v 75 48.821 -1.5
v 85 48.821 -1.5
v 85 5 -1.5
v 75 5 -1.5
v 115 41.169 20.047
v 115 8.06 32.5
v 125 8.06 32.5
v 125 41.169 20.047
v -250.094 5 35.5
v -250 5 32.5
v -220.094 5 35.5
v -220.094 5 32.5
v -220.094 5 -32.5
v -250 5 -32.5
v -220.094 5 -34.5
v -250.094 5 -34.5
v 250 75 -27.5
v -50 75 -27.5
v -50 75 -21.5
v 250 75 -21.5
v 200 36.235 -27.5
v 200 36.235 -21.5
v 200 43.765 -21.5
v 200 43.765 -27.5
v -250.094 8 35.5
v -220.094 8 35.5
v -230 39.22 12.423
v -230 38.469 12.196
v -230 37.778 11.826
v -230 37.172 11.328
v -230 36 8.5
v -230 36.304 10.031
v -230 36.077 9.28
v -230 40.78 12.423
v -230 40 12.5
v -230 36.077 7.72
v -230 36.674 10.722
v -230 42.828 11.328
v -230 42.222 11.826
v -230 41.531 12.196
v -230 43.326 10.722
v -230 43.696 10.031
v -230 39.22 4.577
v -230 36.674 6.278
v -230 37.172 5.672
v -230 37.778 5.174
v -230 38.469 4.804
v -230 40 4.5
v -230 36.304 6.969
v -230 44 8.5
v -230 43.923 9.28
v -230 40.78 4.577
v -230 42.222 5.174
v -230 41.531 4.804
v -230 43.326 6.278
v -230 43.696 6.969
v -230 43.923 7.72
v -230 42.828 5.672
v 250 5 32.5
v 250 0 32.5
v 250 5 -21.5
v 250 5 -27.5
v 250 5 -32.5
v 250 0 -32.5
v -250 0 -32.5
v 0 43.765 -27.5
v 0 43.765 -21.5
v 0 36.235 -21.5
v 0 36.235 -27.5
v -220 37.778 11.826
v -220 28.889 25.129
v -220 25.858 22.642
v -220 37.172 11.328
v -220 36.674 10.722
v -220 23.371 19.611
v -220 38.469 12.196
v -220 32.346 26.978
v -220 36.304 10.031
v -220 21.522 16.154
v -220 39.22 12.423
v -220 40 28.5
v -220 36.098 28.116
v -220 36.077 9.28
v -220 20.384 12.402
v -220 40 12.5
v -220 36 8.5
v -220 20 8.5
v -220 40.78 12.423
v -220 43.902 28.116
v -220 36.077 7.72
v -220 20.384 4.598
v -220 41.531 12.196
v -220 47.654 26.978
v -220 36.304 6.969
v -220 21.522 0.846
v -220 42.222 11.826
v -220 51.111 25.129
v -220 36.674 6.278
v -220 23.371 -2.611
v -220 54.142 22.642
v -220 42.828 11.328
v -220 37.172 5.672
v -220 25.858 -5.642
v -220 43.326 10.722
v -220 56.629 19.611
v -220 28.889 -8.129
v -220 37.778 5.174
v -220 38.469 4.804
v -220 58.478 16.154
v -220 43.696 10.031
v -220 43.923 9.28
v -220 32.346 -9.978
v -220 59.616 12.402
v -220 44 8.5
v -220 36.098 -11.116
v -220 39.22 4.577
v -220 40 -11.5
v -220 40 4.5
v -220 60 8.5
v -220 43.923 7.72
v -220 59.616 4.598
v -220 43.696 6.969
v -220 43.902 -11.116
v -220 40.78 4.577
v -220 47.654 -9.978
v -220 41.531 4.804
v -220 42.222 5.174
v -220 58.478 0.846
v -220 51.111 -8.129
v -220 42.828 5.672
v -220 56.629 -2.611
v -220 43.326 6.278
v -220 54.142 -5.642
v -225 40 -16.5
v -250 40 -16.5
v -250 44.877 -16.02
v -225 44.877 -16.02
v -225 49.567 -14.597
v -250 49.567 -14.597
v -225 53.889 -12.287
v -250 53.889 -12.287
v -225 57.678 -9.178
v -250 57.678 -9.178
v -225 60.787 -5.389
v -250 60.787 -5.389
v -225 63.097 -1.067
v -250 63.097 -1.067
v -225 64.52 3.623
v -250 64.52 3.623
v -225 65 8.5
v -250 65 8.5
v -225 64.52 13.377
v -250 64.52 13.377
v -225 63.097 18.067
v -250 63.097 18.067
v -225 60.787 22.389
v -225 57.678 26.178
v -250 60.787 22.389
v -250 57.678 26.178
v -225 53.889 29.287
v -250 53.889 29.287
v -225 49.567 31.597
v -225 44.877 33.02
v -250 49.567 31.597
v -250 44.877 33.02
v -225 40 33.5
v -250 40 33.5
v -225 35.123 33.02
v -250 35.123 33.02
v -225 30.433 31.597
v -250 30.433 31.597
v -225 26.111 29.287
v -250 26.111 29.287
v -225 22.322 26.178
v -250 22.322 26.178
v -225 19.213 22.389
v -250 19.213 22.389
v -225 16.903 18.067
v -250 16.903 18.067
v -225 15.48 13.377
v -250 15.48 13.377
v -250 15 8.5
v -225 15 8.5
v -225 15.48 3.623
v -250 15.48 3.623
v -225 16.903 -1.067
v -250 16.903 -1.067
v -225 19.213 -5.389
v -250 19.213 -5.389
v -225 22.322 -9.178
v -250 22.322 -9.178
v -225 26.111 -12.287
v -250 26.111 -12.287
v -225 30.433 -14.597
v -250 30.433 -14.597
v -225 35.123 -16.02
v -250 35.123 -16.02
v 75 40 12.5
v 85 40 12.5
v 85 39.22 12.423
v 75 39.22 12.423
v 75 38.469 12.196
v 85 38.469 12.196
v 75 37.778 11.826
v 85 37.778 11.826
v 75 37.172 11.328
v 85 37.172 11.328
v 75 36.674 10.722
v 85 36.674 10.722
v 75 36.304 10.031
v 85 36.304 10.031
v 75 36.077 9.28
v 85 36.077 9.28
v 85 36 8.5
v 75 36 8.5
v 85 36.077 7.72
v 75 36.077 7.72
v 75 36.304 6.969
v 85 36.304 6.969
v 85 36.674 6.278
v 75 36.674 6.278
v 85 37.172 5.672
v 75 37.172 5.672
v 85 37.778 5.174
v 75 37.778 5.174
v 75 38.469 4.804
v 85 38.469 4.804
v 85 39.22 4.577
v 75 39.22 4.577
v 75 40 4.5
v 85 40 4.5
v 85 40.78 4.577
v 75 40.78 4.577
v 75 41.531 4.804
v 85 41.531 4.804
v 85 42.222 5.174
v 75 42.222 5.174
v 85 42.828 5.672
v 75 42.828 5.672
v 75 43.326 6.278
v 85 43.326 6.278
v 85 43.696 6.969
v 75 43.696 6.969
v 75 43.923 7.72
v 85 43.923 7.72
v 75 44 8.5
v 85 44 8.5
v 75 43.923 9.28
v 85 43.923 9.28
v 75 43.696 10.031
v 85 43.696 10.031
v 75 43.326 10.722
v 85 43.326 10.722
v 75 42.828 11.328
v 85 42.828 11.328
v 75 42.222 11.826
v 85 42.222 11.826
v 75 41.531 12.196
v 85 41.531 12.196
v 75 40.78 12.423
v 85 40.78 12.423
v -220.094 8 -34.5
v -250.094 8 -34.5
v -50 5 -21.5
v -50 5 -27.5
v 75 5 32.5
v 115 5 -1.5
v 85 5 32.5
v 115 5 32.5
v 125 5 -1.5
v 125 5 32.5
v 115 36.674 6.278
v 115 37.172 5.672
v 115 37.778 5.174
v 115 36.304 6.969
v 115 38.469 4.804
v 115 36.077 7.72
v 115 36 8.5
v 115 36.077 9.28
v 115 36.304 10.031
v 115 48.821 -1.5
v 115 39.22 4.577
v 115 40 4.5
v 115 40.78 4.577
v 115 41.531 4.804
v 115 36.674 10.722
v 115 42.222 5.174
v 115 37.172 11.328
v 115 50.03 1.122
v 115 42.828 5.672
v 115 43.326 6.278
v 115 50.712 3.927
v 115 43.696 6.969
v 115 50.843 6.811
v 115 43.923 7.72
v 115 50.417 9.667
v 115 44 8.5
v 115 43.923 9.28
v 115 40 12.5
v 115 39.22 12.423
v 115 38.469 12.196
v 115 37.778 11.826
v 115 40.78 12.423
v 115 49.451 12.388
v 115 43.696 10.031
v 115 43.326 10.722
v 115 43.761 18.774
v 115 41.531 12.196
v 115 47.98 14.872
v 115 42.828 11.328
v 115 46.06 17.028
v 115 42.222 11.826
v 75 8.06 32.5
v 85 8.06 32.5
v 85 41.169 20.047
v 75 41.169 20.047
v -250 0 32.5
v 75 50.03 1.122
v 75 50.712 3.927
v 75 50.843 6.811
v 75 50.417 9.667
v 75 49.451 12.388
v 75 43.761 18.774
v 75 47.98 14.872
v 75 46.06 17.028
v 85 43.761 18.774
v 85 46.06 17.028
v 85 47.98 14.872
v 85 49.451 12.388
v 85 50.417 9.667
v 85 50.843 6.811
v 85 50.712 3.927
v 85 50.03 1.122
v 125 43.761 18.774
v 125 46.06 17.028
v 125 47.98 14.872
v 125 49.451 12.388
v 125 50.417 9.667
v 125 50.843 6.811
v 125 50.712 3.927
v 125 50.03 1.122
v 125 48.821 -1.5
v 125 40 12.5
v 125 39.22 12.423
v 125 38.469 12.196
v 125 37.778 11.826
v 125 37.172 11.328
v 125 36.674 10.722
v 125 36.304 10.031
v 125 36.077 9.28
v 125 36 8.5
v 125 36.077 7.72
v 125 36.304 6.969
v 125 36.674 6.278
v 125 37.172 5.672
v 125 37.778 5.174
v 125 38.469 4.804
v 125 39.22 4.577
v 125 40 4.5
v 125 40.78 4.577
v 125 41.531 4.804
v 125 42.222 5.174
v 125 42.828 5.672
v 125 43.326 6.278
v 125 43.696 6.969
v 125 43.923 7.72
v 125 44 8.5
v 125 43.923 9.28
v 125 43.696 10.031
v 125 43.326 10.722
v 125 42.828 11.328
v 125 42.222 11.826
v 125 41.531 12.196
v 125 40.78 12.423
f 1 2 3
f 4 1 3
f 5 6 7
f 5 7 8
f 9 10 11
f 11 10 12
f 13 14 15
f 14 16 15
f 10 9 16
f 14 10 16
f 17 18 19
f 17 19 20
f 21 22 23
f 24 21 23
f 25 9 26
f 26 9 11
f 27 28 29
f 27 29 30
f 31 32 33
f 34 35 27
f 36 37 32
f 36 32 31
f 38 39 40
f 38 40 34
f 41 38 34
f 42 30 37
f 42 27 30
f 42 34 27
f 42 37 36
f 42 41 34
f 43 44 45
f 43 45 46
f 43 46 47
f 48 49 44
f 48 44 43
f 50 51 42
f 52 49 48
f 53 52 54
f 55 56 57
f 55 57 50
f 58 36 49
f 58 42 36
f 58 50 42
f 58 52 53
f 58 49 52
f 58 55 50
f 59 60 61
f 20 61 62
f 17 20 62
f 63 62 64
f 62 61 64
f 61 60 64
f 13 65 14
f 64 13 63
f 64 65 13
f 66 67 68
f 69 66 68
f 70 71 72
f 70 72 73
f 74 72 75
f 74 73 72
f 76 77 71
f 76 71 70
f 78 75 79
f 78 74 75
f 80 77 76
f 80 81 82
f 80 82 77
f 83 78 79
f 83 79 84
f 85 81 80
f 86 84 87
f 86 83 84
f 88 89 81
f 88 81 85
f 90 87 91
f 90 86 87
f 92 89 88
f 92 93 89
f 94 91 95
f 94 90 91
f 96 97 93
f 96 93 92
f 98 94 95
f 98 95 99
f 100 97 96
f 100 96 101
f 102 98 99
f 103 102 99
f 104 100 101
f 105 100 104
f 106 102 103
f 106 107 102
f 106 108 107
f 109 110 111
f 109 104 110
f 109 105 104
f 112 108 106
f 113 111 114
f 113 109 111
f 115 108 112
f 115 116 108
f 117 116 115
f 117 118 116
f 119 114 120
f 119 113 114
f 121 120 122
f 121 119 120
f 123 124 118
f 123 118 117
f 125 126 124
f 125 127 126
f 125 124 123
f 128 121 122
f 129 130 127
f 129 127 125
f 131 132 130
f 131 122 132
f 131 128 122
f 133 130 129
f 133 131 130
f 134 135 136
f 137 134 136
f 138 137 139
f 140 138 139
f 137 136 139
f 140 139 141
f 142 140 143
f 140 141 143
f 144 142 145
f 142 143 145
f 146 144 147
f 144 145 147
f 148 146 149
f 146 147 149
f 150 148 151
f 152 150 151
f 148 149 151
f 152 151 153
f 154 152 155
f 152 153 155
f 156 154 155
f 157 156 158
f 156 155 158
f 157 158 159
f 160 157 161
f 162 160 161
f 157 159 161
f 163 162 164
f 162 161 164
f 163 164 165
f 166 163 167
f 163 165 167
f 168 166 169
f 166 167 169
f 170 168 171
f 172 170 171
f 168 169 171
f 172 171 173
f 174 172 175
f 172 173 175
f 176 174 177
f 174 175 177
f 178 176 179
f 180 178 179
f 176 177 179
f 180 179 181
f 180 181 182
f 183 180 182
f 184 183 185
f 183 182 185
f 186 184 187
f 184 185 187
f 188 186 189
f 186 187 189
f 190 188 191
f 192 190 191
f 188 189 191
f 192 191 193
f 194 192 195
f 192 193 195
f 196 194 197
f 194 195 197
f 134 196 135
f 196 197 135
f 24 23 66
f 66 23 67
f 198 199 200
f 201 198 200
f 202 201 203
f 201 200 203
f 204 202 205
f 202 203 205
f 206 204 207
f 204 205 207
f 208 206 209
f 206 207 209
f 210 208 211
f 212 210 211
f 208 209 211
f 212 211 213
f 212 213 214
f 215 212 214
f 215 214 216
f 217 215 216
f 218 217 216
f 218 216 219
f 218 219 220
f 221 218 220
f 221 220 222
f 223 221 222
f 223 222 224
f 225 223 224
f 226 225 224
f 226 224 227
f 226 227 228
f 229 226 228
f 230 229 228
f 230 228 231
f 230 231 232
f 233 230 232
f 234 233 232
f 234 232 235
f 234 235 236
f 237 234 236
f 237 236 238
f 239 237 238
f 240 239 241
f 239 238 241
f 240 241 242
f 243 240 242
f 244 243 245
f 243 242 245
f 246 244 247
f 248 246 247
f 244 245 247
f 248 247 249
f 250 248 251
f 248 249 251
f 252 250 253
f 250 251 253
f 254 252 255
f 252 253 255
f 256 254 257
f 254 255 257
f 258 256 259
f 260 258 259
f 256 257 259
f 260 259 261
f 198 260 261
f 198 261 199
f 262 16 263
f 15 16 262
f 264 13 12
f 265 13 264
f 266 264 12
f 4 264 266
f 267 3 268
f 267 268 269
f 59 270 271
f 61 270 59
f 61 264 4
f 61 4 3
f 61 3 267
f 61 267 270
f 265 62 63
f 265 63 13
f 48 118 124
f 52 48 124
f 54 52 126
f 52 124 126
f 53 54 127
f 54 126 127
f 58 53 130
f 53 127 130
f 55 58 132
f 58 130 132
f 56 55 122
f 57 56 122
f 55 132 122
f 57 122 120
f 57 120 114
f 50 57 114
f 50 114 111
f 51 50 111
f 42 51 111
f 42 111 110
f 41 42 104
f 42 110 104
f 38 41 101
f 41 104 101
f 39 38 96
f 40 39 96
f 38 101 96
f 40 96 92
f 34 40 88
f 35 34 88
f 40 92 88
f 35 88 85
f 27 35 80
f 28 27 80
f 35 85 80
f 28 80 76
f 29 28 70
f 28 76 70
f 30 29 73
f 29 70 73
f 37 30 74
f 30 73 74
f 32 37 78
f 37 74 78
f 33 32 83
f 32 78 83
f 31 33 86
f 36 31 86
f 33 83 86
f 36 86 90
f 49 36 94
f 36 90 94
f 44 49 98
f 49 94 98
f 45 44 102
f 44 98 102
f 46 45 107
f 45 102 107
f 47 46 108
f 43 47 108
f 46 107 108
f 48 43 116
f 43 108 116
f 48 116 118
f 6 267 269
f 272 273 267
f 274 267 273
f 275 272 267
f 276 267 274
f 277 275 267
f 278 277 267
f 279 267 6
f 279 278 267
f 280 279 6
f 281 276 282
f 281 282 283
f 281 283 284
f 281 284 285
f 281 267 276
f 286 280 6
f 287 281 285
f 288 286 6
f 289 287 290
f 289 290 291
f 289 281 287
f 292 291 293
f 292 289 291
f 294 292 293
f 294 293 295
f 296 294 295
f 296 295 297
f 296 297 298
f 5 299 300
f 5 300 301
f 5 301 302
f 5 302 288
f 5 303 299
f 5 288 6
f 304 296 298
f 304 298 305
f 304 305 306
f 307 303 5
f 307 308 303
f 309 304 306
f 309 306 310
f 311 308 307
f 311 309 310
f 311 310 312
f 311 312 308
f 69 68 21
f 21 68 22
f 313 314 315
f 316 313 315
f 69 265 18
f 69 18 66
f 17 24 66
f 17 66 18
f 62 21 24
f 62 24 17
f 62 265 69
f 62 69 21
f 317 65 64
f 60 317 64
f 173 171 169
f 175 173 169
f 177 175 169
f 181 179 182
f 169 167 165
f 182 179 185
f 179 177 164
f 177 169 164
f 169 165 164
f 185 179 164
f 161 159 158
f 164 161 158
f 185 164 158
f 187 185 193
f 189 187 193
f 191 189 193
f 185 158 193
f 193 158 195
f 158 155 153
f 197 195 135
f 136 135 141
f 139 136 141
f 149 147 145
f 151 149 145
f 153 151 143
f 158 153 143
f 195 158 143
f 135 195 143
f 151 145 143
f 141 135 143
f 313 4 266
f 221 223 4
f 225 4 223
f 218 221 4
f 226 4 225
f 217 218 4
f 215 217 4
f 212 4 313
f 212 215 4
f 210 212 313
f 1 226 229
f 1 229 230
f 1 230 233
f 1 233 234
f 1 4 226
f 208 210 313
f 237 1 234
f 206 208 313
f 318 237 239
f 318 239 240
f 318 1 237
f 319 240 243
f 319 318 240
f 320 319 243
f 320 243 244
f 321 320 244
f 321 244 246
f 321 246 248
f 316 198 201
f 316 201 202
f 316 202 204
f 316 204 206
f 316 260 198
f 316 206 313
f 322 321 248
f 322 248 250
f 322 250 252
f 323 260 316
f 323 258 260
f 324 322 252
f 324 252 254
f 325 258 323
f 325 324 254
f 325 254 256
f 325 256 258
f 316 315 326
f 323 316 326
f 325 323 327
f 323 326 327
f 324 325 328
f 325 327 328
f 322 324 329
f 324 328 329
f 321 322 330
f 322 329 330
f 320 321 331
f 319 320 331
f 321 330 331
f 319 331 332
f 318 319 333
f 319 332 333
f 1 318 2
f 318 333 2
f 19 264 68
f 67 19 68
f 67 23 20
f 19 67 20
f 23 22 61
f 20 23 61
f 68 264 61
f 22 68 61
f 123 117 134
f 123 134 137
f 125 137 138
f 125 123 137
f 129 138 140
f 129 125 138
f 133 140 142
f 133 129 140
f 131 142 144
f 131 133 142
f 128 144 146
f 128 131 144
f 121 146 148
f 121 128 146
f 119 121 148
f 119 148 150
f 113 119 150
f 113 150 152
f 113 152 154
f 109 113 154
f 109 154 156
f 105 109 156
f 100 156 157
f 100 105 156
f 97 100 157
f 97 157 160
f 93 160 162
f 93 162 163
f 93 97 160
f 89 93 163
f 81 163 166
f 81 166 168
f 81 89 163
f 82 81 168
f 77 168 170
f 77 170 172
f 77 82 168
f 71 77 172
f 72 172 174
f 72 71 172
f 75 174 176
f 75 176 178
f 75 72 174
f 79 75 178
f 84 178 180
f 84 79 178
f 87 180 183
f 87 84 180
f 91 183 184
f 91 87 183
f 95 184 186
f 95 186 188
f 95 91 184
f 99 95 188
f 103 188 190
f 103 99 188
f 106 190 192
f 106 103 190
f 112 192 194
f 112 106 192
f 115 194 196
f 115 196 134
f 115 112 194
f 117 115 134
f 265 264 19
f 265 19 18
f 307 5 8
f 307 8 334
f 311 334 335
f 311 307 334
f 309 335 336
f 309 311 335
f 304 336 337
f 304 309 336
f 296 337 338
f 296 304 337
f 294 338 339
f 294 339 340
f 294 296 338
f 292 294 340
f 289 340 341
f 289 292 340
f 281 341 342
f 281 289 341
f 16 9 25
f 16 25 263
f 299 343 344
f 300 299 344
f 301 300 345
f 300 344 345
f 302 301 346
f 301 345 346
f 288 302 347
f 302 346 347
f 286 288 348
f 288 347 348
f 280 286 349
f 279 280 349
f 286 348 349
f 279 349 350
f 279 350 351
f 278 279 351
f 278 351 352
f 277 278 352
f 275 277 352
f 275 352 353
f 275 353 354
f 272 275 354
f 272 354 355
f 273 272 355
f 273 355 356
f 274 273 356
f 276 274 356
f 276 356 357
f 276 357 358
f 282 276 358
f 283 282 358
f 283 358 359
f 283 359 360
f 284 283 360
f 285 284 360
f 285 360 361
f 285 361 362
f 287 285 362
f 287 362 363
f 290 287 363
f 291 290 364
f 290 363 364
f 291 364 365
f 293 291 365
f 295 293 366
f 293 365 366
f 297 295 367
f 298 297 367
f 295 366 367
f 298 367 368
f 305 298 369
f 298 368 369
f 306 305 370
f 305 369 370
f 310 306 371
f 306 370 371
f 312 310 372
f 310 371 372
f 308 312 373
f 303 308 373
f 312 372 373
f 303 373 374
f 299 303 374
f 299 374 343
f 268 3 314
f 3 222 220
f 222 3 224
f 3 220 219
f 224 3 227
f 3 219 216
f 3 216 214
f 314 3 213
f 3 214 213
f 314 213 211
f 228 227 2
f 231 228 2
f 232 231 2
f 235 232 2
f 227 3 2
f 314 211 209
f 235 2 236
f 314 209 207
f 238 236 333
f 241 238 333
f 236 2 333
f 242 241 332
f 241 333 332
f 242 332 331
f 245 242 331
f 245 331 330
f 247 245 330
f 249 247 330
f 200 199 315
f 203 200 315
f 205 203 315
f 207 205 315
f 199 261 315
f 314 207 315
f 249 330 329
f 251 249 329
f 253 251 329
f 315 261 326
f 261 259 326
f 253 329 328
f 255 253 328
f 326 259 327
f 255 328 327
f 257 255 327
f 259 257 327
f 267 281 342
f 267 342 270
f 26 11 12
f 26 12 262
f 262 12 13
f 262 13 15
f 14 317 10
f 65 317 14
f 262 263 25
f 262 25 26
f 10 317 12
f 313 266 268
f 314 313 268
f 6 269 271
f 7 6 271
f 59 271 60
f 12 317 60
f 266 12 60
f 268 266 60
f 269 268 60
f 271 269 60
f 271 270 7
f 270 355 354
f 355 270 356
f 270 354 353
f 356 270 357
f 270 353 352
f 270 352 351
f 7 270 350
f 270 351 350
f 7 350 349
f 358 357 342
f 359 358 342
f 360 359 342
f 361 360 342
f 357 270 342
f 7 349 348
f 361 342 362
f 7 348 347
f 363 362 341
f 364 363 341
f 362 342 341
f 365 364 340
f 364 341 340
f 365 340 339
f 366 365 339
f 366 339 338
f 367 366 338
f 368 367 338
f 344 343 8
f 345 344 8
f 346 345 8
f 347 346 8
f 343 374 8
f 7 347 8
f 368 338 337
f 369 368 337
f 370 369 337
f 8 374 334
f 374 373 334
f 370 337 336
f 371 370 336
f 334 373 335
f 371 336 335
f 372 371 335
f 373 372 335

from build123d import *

# Parameters (mm, degrees)
SKETCH1_W           = 500
SKETCH1_H           = 65
BOSS_EXTRUDE1_DEPTH = 5
SKETCH2_W           = 300
SKETCH2_H           = 6
BOSS_EXTRUDE2_DEPTH = 70
CUT_EXTRUDE1_DEPTH  = 267.535175915
BOSS_EXTRUDE4_DEPTH = 10
SKETCH9_R           = 4
CUT_EXTRUDE2_DEPTH  = 384.804963491
SKETCH10_W          = 30
SKETCH10_H          = 70
BOSS_EXTRUDE5_DEPTH = 3
SKETCH11_R          = 25
BOSS_EXTRUDE6_DEPTH = 30
CHAMFER1_SIZE       = 5
SKETCH12_R          = 4
CUT_EXTRUDE3_DEPTH  = 10


with BuildPart() as part:
    # Sketch1 → Boss-Extrude1 (new body)
    with BuildSketch(Plane(origin=(0, 0, 0), x_dir=(1, 0, 0), z_dir=(0, 1, 0))):
        Rectangle(SKETCH1_W, SKETCH1_H)
    extrude(amount=BOSS_EXTRUDE1_DEPTH)

    # Sketch2 → Boss-Extrude2 (add)
    with BuildSketch(Plane(origin=(0, 5, 0), x_dir=(1, 0, 0), z_dir=(0, 1, 0))):
        with Locations((100, 24.5)):
            Rectangle(SKETCH2_W, SKETCH2_H)
    extrude(amount=BOSS_EXTRUDE2_DEPTH)

    # Sketch3 → Cut-Extrude1 (cut, through all)
    with BuildSketch(Plane.XY.offset(-21.5)):
        Polygon((0, 40), (0, 36.235), (200, 36.235), (200, 40), (200, 43.765), (0, 43.765), align=None)
    extrude(amount=-CUT_EXTRUDE1_DEPTH, mode=Mode.SUBTRACT)

    # Sketch8 → Boss-Extrude4 (add)
    with BuildSketch(Plane(origin=(115, 0, 0), x_dir=(0, 0, -1), z_dir=(1, 0, 0))):
        with BuildLine():
            Line((-32.5, 5), (-32.5, 8.060381504))
            Line((-32.5, 8.060381504), (-20.046797941, 41.169136726))
            ThreePointArc((-20.046797941, 41.169136726), (-11.050785915, 50), (1.5, 48.820953163))
            Line((1.5, 48.820953163), (1.5, 5))
            Line((1.5, 5), (-32.5, 5))
        make_face()
    boss_extrude4 = extrude(amount=BOSS_EXTRUDE4_DEPTH)

    # Mirror1: Boss-Extrude4 across plane
    add(boss_extrude4.mirror(Plane(origin=(100, 0, 0), x_dir=(0, 0, 1), z_dir=(1, 0, 0))))

    # Sketch9 → Cut-Extrude2 (cut, through all)
    with BuildSketch(Plane(origin=(125, 0, 0), x_dir=(0, 0, -1), z_dir=(1, 0, 0))):
        with Locations(Location((-8.5, 40, 0), (0, 0, 180))):
            Circle(SKETCH9_R)
    extrude(amount=-CUT_EXTRUDE2_DEPTH, mode=Mode.SUBTRACT)

    # Sketch10 → Boss-Extrude5 (add)
    with BuildSketch(Plane(origin=(0, 5, 0), x_dir=(1, 0, 0), z_dir=(0, 1, 0))):
        with Locations((-235.094269374, -0.5)):
            Rectangle(SKETCH10_W, SKETCH10_H)
    extrude(amount=BOSS_EXTRUDE5_DEPTH)


with BuildPart() as body_2:
    # Sketch11 → Boss-Extrude6 (new body)
    with BuildSketch(Plane(origin=(-250, 0, 0), x_dir=(0, 0, -1), z_dir=(1, 0, 0))):
        with Locations((-8.5, 40)):
            Circle(SKETCH11_R)
    extrude(amount=BOSS_EXTRUDE6_DEPTH)

    # Chamfer1
    chamfer1_edges = [body_2.edges().sort_by_distance(p)[0] for p in [
        (-220, 40, 33.5),
    ]]
    chamfer(chamfer1_edges, length=CHAMFER1_SIZE)

    # Sketch12 → Cut-Extrude3 (cut)
    with BuildSketch(Plane(origin=(-220, 0, 0), x_dir=(0, 0, -1), z_dir=(1, 0, 0))):
        with Locations((-8.5, 40)):
            Circle(SKETCH12_R)
    extrude(amount=-CUT_EXTRUDE3_DEPTH, mode=Mode.SUBTRACT)


solid = Compound([part.part, body_2.part])
